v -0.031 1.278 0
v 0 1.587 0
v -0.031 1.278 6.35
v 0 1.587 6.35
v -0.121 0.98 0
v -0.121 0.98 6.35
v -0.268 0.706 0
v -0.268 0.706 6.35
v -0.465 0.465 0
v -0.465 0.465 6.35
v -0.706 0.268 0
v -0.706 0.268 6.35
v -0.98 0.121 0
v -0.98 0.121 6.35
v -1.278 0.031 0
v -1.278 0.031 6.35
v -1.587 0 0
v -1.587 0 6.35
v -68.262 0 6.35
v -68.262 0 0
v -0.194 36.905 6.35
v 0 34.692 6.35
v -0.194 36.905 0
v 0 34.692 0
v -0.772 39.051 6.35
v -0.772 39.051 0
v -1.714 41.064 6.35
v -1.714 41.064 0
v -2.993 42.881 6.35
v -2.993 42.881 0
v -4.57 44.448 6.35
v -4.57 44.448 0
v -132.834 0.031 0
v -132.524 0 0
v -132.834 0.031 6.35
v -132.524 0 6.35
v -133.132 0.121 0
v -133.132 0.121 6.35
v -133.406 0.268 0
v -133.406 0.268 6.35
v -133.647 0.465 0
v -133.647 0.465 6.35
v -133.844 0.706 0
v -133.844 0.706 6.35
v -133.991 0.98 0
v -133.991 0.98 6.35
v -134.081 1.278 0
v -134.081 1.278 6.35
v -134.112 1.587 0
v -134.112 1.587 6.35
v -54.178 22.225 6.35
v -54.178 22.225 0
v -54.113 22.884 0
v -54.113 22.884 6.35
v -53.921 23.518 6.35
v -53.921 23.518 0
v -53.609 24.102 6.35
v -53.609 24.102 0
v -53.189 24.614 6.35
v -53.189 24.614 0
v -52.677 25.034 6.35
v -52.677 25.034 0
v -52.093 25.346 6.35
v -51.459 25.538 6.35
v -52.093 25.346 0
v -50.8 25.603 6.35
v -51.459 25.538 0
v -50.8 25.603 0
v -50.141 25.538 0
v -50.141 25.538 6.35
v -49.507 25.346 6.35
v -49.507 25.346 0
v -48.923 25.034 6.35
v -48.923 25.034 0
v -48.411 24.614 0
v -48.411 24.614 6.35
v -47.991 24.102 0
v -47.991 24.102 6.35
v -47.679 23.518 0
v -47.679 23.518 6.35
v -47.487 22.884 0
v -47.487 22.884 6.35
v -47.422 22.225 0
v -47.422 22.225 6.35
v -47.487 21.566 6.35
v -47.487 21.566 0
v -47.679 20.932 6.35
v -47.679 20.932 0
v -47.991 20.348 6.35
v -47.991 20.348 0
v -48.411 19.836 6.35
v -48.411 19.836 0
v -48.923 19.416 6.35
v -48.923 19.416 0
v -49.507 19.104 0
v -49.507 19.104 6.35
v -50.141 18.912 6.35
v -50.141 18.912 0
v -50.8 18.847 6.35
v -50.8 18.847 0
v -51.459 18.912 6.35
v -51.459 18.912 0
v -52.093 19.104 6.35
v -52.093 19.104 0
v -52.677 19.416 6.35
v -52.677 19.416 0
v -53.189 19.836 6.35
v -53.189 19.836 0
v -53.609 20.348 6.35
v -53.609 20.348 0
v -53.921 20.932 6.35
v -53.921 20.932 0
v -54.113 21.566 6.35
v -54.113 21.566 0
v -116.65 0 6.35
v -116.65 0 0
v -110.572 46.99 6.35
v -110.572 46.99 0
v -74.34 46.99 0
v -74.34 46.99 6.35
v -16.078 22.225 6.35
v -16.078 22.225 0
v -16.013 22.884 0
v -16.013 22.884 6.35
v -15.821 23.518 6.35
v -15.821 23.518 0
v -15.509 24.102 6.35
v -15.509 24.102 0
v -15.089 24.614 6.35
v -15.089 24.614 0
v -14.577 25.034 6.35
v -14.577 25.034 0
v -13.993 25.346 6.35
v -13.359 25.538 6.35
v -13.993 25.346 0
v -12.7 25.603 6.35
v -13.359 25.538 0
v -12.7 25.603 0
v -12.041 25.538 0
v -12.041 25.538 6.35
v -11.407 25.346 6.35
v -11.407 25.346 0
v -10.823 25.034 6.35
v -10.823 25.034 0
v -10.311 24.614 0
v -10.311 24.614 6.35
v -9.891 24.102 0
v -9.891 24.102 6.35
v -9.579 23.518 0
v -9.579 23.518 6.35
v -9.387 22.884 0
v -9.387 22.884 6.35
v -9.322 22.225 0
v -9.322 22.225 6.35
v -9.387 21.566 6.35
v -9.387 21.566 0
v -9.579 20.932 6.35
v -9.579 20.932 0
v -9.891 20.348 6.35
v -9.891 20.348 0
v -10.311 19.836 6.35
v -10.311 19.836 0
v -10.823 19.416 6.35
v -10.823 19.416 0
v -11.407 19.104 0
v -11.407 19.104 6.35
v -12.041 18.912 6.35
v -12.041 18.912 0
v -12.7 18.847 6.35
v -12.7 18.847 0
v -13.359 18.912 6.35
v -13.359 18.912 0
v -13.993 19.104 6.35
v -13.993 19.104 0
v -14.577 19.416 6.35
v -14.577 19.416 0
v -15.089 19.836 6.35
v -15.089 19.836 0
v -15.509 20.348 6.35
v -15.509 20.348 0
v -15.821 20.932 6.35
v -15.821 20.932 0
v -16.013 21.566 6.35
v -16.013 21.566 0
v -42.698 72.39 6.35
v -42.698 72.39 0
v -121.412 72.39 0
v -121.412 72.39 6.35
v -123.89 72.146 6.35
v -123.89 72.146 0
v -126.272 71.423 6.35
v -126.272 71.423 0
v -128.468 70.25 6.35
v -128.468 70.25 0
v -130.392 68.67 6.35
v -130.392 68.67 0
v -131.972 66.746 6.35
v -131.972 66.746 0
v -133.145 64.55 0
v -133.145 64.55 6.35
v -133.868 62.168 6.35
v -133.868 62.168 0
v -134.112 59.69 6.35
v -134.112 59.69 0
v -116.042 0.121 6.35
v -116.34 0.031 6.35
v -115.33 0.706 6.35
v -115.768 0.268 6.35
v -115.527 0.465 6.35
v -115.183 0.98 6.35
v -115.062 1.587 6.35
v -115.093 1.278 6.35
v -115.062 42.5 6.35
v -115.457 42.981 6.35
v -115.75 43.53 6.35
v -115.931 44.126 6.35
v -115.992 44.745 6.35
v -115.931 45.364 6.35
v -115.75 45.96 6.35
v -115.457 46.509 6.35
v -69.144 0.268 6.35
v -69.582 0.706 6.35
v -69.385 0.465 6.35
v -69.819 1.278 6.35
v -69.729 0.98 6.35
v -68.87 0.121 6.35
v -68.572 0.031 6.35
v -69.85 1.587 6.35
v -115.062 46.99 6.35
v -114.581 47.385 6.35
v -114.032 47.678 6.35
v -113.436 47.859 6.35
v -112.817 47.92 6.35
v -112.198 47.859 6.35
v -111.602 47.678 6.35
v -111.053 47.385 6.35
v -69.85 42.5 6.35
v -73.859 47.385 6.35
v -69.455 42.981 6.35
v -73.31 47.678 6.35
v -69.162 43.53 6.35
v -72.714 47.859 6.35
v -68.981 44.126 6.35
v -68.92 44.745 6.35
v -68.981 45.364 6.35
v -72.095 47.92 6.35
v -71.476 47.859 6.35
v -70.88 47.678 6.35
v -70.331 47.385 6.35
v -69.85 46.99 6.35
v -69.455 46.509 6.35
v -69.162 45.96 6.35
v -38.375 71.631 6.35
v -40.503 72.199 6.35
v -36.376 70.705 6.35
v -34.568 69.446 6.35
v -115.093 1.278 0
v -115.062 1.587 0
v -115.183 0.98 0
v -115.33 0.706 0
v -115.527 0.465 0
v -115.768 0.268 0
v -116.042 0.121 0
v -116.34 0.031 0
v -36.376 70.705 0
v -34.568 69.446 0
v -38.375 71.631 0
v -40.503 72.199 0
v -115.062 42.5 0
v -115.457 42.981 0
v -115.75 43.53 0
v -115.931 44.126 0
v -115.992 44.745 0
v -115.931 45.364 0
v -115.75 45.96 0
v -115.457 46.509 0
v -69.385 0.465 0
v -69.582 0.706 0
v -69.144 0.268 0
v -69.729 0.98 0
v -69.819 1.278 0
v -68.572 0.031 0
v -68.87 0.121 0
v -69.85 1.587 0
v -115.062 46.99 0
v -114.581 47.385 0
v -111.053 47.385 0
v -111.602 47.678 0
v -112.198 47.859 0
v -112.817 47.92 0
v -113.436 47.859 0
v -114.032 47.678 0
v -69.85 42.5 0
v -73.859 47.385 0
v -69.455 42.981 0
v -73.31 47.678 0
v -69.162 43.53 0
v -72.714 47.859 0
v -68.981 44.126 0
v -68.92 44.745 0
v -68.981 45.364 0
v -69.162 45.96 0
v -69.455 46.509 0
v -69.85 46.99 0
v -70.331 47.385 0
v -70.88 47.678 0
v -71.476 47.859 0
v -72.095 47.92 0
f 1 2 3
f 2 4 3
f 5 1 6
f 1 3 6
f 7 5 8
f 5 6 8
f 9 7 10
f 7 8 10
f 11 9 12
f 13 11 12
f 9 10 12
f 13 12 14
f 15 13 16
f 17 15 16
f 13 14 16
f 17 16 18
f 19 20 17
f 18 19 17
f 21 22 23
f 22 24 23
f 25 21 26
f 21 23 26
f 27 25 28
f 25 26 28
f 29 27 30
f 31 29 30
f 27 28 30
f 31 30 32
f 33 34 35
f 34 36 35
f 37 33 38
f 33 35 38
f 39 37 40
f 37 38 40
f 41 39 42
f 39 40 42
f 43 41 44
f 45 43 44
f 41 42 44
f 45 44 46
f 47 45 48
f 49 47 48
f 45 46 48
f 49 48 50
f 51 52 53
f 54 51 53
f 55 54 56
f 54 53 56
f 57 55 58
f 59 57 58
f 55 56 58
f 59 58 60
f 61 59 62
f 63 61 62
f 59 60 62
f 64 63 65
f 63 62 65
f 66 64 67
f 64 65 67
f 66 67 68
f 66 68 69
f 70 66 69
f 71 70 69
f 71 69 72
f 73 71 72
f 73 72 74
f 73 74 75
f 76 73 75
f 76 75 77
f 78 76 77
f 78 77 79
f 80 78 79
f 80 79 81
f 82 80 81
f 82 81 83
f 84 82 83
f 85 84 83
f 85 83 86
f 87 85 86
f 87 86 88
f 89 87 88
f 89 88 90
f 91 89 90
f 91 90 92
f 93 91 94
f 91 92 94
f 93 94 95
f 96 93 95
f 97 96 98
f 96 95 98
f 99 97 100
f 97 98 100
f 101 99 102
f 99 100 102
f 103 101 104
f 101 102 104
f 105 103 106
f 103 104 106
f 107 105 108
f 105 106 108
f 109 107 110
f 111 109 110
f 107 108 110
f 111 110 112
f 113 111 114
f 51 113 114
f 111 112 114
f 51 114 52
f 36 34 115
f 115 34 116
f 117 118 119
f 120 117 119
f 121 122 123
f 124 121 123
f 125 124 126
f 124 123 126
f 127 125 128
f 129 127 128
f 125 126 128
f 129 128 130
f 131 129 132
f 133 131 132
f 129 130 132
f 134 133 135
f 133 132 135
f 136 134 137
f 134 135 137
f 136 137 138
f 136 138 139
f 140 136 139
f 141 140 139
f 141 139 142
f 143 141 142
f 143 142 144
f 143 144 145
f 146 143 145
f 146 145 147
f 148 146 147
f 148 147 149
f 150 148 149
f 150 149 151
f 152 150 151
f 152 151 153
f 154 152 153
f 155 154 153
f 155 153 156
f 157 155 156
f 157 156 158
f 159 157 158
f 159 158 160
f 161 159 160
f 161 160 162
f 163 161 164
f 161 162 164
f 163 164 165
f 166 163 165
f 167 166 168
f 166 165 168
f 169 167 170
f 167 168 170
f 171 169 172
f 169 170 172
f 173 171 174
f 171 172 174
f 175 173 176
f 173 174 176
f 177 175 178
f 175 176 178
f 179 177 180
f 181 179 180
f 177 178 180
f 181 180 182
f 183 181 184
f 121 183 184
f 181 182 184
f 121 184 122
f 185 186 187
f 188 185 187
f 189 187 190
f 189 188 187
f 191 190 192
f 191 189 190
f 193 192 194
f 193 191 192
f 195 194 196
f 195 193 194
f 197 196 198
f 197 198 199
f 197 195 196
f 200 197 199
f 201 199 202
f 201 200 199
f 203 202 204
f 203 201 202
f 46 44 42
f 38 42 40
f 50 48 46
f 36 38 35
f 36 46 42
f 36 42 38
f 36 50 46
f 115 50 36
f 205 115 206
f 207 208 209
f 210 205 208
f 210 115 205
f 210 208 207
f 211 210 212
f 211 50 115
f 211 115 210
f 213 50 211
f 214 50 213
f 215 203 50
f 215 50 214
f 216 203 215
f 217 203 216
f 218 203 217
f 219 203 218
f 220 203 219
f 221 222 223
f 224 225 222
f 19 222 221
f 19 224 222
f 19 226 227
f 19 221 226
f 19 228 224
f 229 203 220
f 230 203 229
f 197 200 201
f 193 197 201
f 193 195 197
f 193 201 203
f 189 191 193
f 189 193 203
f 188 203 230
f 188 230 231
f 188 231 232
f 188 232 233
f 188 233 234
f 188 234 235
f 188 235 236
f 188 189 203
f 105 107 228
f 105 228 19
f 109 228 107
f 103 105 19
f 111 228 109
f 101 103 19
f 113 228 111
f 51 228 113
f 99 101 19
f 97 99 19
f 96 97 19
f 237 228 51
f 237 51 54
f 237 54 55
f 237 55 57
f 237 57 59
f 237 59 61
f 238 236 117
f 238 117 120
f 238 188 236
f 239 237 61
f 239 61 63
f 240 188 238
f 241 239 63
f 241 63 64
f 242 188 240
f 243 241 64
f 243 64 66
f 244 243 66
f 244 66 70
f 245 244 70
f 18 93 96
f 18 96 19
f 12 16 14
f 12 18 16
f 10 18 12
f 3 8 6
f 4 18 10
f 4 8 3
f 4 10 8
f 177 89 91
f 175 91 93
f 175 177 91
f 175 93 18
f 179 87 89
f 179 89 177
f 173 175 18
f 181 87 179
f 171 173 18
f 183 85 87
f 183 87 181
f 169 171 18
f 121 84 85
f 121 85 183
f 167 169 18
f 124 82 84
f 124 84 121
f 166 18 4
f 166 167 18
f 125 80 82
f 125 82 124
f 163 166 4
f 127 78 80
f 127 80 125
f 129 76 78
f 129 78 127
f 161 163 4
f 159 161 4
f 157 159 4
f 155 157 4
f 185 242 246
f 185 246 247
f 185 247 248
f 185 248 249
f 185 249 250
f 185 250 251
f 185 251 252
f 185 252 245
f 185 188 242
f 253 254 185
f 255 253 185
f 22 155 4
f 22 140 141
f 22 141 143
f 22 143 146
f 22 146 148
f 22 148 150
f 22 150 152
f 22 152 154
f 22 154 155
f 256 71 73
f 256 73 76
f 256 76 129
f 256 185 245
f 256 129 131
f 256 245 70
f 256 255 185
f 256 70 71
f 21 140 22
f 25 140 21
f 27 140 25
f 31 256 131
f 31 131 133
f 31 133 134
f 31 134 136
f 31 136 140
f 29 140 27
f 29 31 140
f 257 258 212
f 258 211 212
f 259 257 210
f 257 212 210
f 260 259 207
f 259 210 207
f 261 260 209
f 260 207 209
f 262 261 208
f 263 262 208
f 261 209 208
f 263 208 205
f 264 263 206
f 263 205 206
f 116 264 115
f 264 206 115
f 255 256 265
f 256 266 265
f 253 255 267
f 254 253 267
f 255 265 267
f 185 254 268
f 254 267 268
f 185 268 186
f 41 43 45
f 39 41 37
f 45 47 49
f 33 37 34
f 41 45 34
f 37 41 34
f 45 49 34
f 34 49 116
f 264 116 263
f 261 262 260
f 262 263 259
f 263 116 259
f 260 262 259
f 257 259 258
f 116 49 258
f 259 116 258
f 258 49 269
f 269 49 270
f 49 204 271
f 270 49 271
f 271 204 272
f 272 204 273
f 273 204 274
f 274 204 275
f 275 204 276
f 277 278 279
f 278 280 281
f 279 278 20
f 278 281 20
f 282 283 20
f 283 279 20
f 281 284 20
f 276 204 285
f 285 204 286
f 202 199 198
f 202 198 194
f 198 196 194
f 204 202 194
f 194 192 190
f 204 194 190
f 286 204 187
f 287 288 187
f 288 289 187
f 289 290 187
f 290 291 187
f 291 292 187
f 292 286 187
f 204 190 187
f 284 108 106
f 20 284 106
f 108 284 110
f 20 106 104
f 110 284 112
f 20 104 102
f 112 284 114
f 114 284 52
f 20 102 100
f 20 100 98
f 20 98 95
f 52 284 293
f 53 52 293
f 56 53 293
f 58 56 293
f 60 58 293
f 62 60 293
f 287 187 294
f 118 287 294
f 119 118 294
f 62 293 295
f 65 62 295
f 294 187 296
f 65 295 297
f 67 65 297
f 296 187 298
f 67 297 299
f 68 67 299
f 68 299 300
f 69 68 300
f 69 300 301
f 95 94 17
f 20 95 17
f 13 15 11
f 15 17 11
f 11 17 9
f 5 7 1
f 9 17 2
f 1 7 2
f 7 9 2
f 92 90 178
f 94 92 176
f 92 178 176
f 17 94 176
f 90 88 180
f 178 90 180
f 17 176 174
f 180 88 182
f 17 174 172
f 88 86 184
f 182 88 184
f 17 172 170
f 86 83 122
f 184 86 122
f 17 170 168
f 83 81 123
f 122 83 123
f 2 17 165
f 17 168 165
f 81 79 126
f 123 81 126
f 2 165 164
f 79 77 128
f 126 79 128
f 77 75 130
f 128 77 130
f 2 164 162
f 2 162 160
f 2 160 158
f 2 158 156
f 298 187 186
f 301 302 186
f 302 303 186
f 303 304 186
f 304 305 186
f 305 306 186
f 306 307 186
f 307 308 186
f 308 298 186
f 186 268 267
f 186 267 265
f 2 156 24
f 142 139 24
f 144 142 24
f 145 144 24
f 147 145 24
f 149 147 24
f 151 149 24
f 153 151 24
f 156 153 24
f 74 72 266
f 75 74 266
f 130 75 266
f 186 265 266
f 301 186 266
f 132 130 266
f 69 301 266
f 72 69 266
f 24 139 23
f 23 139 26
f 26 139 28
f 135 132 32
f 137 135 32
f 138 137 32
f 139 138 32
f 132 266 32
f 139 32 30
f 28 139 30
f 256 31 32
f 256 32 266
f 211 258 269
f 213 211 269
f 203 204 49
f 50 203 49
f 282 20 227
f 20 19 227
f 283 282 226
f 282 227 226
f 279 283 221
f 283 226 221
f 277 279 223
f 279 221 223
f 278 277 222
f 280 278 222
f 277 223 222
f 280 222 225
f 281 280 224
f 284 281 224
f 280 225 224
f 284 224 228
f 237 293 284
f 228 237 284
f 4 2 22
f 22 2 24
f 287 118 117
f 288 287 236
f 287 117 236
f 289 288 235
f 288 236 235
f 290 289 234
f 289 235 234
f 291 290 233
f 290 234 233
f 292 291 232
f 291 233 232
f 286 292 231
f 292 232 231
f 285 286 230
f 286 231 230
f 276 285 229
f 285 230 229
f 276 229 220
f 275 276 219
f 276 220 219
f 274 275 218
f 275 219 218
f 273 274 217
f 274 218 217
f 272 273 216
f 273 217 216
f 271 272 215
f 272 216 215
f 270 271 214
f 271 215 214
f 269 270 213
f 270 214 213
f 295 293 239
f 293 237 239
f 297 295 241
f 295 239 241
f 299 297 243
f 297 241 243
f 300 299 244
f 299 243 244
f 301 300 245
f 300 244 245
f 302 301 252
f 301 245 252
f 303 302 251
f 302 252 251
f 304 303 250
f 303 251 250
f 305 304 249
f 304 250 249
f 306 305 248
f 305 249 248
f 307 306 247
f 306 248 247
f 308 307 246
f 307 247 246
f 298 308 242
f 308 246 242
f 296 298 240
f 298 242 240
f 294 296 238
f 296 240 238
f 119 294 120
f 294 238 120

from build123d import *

# Parameters (mm, degrees)
BOSS_EXTRUDE1_DEPTH     = 6.35
F_1_4_CLEARANCE_HOLE1_D = 6.7564
CUT_EXTRUDE1_DEPTH      = 7.35
FILLET1_R               = 1.5875
FILLET2_R               = 12.7
SKETCH7_R               = 3.175
CUT_EXTRUDE2_DEPTH      = 7.35


with BuildPart() as part:
    # Sketch3 → Boss-Extrude1 (new body)
    with BuildSketch(Plane.XY):
        Polygon((0, 0), (0, 72.39), (-134.112, 72.39), (-134.112, 0), (-115.062, 0), (-115.062, 46.99), (-69.85, 46.99), (-69.85, 0), align=None)
    extrude(amount=BOSS_EXTRUDE1_DEPTH)

    # 1/4 Clearance Hole1 (through all)
    with Locations(Plane.XY.offset(6.35)):
        with Locations((-50.8, 22.225), (-12.7, 22.225)):
            Hole(F_1_4_CLEARANCE_HOLE1_D / 2)

    # Sketch6 → Cut-Extrude1 (cut, through all)
    with BuildSketch(Plane.XY.offset(6.35)):
        Polygon((0, 72.39), (0, 40.64), (-38.1, 72.39), align=None)
    extrude(amount=-CUT_EXTRUDE1_DEPTH, mode=Mode.SUBTRACT)

    # Fillet1
    fillet1_edges = [part.edges().sort_by_distance(p)[0] for p in [
        (-69.85, 0, 3.175),
        (-115.062, 0, 3.175),
        (-134.112, 0, 3.175),
        (0, 0, 3.175),
    ]]
    fillet(fillet1_edges, radius=FILLET1_R)

    # Fillet2
    fillet2_edges = [part.edges().sort_by_distance(p)[0] for p in [
        (-134.112, 72.39, 3.175),
        (-38.1, 72.39, 3.175),
        (0, 40.64, 3.175),
    ]]
    fillet(fillet2_edges, radius=FILLET2_R)

    # Sketch7 → Cut-Extrude2 (cut, through all)
    with BuildSketch(Plane.XY.offset(6.35)):
        with Locations((-112.81693597, 44.74493597)):
            Circle(SKETCH7_R)
        with Locations((-72.09506403, 44.74493597)):
            Circle(SKETCH7_R)
    extrude(amount=-CUT_EXTRUDE2_DEPTH, mode=Mode.SUBTRACT)


solid = part.part
